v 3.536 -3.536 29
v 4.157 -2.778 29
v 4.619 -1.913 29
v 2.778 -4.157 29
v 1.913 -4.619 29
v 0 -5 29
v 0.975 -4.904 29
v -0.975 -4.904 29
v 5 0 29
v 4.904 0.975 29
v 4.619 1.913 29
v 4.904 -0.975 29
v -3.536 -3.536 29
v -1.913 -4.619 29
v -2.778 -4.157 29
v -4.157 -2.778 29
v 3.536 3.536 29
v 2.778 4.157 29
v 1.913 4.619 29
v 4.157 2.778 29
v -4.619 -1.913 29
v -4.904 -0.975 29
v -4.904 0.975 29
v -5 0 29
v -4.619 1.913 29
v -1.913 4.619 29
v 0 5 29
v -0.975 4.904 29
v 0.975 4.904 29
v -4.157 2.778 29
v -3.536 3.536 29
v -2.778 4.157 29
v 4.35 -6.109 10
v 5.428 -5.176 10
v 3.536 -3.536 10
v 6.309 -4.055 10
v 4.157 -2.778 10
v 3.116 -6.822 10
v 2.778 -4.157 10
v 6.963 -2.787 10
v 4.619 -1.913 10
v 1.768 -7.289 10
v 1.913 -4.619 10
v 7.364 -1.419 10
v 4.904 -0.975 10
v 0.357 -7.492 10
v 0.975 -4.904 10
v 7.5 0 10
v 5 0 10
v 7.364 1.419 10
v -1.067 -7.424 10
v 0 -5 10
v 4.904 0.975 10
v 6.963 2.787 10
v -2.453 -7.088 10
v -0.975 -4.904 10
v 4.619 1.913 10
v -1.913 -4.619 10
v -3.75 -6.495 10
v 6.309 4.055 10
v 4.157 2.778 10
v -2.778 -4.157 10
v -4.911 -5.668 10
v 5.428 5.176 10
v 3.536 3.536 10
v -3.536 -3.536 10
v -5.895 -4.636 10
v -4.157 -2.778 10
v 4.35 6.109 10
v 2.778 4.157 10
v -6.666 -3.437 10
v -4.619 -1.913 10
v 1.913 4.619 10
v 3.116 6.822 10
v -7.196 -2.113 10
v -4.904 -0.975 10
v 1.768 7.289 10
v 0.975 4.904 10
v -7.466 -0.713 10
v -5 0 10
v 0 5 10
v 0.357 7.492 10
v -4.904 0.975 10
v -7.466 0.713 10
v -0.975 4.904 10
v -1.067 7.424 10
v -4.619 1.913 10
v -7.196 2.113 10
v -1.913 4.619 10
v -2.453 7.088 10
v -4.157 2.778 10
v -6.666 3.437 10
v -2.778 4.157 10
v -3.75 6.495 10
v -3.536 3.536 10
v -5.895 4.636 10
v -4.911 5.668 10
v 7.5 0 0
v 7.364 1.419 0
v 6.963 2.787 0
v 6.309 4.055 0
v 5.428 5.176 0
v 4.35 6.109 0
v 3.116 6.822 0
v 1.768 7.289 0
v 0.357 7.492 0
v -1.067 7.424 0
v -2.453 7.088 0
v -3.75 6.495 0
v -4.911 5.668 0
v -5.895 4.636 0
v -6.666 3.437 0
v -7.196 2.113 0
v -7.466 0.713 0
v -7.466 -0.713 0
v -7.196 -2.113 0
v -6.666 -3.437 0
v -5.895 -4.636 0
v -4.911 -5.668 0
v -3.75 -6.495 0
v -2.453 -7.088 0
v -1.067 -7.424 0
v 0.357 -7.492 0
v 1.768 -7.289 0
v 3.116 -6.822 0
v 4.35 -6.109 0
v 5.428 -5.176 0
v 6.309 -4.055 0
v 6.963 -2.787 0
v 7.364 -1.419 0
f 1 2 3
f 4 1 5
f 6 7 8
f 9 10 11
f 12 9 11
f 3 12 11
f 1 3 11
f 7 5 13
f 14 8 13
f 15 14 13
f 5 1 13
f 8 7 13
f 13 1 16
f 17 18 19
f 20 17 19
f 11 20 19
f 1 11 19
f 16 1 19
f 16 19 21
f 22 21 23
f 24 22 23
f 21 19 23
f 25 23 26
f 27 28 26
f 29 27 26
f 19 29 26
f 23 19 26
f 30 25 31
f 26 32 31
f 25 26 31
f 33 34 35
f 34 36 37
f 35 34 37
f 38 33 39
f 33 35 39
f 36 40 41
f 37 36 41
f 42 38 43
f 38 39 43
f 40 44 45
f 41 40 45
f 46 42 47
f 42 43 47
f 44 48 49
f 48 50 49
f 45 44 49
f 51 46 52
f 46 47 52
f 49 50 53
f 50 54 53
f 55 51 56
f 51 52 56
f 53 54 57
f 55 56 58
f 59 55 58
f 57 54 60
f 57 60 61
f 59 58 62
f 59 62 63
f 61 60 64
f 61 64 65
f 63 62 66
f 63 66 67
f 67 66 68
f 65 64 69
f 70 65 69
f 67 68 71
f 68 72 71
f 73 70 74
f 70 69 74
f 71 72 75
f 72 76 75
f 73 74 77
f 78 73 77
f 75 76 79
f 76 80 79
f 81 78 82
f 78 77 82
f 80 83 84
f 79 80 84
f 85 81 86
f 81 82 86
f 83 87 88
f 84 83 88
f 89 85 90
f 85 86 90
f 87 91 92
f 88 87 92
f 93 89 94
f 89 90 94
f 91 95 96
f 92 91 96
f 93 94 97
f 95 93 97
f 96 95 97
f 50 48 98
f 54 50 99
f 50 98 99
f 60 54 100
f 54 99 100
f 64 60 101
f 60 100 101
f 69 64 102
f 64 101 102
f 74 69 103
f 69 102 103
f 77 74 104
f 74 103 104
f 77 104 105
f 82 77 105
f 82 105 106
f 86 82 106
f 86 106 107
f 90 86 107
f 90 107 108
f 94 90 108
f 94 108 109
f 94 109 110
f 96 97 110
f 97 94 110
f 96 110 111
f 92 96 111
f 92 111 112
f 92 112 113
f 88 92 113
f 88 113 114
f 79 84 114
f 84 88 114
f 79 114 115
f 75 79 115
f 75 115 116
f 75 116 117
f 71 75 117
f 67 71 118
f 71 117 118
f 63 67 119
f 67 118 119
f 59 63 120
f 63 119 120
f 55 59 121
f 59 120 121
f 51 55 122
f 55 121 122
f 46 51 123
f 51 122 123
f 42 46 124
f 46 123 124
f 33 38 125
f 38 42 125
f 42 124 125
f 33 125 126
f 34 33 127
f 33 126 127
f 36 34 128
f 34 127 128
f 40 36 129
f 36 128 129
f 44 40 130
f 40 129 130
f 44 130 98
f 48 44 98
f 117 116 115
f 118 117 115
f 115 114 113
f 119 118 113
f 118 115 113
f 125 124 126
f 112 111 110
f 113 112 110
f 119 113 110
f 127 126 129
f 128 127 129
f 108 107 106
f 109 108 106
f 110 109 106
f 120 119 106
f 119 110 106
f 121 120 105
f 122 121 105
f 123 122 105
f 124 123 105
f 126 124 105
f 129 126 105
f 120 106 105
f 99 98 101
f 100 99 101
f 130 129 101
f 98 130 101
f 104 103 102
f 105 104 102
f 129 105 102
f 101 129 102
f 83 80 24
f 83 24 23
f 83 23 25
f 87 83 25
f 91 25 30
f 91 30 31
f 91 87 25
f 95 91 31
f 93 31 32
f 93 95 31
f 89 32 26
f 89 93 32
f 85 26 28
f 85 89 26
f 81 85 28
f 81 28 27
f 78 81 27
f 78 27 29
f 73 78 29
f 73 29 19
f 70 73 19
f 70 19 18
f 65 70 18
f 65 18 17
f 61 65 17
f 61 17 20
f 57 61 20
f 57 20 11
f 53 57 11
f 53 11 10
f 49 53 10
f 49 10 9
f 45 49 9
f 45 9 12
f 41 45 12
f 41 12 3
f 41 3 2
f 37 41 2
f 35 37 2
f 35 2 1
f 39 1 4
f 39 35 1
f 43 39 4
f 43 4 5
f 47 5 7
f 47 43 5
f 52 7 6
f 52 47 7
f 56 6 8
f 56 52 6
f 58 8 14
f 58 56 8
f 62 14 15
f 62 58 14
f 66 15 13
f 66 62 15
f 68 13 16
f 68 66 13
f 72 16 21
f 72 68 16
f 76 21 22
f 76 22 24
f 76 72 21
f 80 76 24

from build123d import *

# Parameters (mm, degrees)
SKETCH1_R           = 7.5
BOSS_EXTRUDE1_DEPTH = 250
SKETCH2_R           = 5
CUT_EXTRUDE1_DEPTH  = 10
SKETCH3_R           = 9.435011435
SKETCH3_R_2         = 5
CUT_EXTRUDE2_DEPTH  = 19
SKETCH5_R           = 25.765699078
CUT_EXTRUDE3_DEPTH  = 221
SKETCH6_R           = 5.5
BOSS_EXTRUDE2_DEPTH = 10


with BuildPart() as part:
    # Sketch1 → Boss-Extrude1 (new body)
    with BuildSketch(Plane.XY):
        Circle(SKETCH1_R)
    extrude(amount=BOSS_EXTRUDE1_DEPTH)

    # Sketch2 → Cut-Extrude1 (cut)
    with BuildSketch(Plane.XY):
        Circle(SKETCH2_R)
    extrude(amount=CUT_EXTRUDE1_DEPTH, mode=Mode.SUBTRACT)

    # Sketch3 → Cut-Extrude2 (cut)
    with BuildSketch(Plane(origin=(0, 0, 10), x_dir=(-1, 0, 0), z_dir=(0, 0, -1))):
        Circle(SKETCH3_R)
        Circle(SKETCH3_R_2, mode=Mode.SUBTRACT)
    extrude(amount=-CUT_EXTRUDE2_DEPTH, mode=Mode.SUBTRACT)


with BuildPart() as cut_extrude2_piece_1:
    # of the separate pieces the step leaves, piece 1, a body of its own (cut_extrude2_pieces)
    add(part.part.solids().sort_by_distance((7.5, 0, 29))[0])

    # Sketch5 → Cut-Extrude3 (cut)
    with BuildSketch(Plane(origin=(0, 0, 29), x_dir=(-1, 0, 0), z_dir=(0, 0, -1))):
        Circle(SKETCH5_R)
    extrude(amount=-CUT_EXTRUDE3_DEPTH, mode=Mode.SUBTRACT)



with BuildPart() as cut_extrude2_piece_2:
    # of the separate pieces the step leaves, piece 2, a body of its own (cut_extrude2_pieces)
    add(part.part.solids().sort_by_distance((7.5, 0, 0))[0])


with BuildPart() as cut_extrude2_piece_1_1:
    add(cut_extrude2_piece_1.part)

    add(cut_extrude2_piece_2.part)  # Boss-Extrude2 merges Cut-Extrude2 piece 2
    # Sketch6 → Boss-Extrude2 (add)
    with BuildSketch(Plane(origin=(0, 0, 10), x_dir=(-1, 0, 0), z_dir=(0, 0, -1))):
        Circle(SKETCH6_R)
    extrude(amount=BOSS_EXTRUDE2_DEPTH)


solid = cut_extrude2_piece_1_1.part
